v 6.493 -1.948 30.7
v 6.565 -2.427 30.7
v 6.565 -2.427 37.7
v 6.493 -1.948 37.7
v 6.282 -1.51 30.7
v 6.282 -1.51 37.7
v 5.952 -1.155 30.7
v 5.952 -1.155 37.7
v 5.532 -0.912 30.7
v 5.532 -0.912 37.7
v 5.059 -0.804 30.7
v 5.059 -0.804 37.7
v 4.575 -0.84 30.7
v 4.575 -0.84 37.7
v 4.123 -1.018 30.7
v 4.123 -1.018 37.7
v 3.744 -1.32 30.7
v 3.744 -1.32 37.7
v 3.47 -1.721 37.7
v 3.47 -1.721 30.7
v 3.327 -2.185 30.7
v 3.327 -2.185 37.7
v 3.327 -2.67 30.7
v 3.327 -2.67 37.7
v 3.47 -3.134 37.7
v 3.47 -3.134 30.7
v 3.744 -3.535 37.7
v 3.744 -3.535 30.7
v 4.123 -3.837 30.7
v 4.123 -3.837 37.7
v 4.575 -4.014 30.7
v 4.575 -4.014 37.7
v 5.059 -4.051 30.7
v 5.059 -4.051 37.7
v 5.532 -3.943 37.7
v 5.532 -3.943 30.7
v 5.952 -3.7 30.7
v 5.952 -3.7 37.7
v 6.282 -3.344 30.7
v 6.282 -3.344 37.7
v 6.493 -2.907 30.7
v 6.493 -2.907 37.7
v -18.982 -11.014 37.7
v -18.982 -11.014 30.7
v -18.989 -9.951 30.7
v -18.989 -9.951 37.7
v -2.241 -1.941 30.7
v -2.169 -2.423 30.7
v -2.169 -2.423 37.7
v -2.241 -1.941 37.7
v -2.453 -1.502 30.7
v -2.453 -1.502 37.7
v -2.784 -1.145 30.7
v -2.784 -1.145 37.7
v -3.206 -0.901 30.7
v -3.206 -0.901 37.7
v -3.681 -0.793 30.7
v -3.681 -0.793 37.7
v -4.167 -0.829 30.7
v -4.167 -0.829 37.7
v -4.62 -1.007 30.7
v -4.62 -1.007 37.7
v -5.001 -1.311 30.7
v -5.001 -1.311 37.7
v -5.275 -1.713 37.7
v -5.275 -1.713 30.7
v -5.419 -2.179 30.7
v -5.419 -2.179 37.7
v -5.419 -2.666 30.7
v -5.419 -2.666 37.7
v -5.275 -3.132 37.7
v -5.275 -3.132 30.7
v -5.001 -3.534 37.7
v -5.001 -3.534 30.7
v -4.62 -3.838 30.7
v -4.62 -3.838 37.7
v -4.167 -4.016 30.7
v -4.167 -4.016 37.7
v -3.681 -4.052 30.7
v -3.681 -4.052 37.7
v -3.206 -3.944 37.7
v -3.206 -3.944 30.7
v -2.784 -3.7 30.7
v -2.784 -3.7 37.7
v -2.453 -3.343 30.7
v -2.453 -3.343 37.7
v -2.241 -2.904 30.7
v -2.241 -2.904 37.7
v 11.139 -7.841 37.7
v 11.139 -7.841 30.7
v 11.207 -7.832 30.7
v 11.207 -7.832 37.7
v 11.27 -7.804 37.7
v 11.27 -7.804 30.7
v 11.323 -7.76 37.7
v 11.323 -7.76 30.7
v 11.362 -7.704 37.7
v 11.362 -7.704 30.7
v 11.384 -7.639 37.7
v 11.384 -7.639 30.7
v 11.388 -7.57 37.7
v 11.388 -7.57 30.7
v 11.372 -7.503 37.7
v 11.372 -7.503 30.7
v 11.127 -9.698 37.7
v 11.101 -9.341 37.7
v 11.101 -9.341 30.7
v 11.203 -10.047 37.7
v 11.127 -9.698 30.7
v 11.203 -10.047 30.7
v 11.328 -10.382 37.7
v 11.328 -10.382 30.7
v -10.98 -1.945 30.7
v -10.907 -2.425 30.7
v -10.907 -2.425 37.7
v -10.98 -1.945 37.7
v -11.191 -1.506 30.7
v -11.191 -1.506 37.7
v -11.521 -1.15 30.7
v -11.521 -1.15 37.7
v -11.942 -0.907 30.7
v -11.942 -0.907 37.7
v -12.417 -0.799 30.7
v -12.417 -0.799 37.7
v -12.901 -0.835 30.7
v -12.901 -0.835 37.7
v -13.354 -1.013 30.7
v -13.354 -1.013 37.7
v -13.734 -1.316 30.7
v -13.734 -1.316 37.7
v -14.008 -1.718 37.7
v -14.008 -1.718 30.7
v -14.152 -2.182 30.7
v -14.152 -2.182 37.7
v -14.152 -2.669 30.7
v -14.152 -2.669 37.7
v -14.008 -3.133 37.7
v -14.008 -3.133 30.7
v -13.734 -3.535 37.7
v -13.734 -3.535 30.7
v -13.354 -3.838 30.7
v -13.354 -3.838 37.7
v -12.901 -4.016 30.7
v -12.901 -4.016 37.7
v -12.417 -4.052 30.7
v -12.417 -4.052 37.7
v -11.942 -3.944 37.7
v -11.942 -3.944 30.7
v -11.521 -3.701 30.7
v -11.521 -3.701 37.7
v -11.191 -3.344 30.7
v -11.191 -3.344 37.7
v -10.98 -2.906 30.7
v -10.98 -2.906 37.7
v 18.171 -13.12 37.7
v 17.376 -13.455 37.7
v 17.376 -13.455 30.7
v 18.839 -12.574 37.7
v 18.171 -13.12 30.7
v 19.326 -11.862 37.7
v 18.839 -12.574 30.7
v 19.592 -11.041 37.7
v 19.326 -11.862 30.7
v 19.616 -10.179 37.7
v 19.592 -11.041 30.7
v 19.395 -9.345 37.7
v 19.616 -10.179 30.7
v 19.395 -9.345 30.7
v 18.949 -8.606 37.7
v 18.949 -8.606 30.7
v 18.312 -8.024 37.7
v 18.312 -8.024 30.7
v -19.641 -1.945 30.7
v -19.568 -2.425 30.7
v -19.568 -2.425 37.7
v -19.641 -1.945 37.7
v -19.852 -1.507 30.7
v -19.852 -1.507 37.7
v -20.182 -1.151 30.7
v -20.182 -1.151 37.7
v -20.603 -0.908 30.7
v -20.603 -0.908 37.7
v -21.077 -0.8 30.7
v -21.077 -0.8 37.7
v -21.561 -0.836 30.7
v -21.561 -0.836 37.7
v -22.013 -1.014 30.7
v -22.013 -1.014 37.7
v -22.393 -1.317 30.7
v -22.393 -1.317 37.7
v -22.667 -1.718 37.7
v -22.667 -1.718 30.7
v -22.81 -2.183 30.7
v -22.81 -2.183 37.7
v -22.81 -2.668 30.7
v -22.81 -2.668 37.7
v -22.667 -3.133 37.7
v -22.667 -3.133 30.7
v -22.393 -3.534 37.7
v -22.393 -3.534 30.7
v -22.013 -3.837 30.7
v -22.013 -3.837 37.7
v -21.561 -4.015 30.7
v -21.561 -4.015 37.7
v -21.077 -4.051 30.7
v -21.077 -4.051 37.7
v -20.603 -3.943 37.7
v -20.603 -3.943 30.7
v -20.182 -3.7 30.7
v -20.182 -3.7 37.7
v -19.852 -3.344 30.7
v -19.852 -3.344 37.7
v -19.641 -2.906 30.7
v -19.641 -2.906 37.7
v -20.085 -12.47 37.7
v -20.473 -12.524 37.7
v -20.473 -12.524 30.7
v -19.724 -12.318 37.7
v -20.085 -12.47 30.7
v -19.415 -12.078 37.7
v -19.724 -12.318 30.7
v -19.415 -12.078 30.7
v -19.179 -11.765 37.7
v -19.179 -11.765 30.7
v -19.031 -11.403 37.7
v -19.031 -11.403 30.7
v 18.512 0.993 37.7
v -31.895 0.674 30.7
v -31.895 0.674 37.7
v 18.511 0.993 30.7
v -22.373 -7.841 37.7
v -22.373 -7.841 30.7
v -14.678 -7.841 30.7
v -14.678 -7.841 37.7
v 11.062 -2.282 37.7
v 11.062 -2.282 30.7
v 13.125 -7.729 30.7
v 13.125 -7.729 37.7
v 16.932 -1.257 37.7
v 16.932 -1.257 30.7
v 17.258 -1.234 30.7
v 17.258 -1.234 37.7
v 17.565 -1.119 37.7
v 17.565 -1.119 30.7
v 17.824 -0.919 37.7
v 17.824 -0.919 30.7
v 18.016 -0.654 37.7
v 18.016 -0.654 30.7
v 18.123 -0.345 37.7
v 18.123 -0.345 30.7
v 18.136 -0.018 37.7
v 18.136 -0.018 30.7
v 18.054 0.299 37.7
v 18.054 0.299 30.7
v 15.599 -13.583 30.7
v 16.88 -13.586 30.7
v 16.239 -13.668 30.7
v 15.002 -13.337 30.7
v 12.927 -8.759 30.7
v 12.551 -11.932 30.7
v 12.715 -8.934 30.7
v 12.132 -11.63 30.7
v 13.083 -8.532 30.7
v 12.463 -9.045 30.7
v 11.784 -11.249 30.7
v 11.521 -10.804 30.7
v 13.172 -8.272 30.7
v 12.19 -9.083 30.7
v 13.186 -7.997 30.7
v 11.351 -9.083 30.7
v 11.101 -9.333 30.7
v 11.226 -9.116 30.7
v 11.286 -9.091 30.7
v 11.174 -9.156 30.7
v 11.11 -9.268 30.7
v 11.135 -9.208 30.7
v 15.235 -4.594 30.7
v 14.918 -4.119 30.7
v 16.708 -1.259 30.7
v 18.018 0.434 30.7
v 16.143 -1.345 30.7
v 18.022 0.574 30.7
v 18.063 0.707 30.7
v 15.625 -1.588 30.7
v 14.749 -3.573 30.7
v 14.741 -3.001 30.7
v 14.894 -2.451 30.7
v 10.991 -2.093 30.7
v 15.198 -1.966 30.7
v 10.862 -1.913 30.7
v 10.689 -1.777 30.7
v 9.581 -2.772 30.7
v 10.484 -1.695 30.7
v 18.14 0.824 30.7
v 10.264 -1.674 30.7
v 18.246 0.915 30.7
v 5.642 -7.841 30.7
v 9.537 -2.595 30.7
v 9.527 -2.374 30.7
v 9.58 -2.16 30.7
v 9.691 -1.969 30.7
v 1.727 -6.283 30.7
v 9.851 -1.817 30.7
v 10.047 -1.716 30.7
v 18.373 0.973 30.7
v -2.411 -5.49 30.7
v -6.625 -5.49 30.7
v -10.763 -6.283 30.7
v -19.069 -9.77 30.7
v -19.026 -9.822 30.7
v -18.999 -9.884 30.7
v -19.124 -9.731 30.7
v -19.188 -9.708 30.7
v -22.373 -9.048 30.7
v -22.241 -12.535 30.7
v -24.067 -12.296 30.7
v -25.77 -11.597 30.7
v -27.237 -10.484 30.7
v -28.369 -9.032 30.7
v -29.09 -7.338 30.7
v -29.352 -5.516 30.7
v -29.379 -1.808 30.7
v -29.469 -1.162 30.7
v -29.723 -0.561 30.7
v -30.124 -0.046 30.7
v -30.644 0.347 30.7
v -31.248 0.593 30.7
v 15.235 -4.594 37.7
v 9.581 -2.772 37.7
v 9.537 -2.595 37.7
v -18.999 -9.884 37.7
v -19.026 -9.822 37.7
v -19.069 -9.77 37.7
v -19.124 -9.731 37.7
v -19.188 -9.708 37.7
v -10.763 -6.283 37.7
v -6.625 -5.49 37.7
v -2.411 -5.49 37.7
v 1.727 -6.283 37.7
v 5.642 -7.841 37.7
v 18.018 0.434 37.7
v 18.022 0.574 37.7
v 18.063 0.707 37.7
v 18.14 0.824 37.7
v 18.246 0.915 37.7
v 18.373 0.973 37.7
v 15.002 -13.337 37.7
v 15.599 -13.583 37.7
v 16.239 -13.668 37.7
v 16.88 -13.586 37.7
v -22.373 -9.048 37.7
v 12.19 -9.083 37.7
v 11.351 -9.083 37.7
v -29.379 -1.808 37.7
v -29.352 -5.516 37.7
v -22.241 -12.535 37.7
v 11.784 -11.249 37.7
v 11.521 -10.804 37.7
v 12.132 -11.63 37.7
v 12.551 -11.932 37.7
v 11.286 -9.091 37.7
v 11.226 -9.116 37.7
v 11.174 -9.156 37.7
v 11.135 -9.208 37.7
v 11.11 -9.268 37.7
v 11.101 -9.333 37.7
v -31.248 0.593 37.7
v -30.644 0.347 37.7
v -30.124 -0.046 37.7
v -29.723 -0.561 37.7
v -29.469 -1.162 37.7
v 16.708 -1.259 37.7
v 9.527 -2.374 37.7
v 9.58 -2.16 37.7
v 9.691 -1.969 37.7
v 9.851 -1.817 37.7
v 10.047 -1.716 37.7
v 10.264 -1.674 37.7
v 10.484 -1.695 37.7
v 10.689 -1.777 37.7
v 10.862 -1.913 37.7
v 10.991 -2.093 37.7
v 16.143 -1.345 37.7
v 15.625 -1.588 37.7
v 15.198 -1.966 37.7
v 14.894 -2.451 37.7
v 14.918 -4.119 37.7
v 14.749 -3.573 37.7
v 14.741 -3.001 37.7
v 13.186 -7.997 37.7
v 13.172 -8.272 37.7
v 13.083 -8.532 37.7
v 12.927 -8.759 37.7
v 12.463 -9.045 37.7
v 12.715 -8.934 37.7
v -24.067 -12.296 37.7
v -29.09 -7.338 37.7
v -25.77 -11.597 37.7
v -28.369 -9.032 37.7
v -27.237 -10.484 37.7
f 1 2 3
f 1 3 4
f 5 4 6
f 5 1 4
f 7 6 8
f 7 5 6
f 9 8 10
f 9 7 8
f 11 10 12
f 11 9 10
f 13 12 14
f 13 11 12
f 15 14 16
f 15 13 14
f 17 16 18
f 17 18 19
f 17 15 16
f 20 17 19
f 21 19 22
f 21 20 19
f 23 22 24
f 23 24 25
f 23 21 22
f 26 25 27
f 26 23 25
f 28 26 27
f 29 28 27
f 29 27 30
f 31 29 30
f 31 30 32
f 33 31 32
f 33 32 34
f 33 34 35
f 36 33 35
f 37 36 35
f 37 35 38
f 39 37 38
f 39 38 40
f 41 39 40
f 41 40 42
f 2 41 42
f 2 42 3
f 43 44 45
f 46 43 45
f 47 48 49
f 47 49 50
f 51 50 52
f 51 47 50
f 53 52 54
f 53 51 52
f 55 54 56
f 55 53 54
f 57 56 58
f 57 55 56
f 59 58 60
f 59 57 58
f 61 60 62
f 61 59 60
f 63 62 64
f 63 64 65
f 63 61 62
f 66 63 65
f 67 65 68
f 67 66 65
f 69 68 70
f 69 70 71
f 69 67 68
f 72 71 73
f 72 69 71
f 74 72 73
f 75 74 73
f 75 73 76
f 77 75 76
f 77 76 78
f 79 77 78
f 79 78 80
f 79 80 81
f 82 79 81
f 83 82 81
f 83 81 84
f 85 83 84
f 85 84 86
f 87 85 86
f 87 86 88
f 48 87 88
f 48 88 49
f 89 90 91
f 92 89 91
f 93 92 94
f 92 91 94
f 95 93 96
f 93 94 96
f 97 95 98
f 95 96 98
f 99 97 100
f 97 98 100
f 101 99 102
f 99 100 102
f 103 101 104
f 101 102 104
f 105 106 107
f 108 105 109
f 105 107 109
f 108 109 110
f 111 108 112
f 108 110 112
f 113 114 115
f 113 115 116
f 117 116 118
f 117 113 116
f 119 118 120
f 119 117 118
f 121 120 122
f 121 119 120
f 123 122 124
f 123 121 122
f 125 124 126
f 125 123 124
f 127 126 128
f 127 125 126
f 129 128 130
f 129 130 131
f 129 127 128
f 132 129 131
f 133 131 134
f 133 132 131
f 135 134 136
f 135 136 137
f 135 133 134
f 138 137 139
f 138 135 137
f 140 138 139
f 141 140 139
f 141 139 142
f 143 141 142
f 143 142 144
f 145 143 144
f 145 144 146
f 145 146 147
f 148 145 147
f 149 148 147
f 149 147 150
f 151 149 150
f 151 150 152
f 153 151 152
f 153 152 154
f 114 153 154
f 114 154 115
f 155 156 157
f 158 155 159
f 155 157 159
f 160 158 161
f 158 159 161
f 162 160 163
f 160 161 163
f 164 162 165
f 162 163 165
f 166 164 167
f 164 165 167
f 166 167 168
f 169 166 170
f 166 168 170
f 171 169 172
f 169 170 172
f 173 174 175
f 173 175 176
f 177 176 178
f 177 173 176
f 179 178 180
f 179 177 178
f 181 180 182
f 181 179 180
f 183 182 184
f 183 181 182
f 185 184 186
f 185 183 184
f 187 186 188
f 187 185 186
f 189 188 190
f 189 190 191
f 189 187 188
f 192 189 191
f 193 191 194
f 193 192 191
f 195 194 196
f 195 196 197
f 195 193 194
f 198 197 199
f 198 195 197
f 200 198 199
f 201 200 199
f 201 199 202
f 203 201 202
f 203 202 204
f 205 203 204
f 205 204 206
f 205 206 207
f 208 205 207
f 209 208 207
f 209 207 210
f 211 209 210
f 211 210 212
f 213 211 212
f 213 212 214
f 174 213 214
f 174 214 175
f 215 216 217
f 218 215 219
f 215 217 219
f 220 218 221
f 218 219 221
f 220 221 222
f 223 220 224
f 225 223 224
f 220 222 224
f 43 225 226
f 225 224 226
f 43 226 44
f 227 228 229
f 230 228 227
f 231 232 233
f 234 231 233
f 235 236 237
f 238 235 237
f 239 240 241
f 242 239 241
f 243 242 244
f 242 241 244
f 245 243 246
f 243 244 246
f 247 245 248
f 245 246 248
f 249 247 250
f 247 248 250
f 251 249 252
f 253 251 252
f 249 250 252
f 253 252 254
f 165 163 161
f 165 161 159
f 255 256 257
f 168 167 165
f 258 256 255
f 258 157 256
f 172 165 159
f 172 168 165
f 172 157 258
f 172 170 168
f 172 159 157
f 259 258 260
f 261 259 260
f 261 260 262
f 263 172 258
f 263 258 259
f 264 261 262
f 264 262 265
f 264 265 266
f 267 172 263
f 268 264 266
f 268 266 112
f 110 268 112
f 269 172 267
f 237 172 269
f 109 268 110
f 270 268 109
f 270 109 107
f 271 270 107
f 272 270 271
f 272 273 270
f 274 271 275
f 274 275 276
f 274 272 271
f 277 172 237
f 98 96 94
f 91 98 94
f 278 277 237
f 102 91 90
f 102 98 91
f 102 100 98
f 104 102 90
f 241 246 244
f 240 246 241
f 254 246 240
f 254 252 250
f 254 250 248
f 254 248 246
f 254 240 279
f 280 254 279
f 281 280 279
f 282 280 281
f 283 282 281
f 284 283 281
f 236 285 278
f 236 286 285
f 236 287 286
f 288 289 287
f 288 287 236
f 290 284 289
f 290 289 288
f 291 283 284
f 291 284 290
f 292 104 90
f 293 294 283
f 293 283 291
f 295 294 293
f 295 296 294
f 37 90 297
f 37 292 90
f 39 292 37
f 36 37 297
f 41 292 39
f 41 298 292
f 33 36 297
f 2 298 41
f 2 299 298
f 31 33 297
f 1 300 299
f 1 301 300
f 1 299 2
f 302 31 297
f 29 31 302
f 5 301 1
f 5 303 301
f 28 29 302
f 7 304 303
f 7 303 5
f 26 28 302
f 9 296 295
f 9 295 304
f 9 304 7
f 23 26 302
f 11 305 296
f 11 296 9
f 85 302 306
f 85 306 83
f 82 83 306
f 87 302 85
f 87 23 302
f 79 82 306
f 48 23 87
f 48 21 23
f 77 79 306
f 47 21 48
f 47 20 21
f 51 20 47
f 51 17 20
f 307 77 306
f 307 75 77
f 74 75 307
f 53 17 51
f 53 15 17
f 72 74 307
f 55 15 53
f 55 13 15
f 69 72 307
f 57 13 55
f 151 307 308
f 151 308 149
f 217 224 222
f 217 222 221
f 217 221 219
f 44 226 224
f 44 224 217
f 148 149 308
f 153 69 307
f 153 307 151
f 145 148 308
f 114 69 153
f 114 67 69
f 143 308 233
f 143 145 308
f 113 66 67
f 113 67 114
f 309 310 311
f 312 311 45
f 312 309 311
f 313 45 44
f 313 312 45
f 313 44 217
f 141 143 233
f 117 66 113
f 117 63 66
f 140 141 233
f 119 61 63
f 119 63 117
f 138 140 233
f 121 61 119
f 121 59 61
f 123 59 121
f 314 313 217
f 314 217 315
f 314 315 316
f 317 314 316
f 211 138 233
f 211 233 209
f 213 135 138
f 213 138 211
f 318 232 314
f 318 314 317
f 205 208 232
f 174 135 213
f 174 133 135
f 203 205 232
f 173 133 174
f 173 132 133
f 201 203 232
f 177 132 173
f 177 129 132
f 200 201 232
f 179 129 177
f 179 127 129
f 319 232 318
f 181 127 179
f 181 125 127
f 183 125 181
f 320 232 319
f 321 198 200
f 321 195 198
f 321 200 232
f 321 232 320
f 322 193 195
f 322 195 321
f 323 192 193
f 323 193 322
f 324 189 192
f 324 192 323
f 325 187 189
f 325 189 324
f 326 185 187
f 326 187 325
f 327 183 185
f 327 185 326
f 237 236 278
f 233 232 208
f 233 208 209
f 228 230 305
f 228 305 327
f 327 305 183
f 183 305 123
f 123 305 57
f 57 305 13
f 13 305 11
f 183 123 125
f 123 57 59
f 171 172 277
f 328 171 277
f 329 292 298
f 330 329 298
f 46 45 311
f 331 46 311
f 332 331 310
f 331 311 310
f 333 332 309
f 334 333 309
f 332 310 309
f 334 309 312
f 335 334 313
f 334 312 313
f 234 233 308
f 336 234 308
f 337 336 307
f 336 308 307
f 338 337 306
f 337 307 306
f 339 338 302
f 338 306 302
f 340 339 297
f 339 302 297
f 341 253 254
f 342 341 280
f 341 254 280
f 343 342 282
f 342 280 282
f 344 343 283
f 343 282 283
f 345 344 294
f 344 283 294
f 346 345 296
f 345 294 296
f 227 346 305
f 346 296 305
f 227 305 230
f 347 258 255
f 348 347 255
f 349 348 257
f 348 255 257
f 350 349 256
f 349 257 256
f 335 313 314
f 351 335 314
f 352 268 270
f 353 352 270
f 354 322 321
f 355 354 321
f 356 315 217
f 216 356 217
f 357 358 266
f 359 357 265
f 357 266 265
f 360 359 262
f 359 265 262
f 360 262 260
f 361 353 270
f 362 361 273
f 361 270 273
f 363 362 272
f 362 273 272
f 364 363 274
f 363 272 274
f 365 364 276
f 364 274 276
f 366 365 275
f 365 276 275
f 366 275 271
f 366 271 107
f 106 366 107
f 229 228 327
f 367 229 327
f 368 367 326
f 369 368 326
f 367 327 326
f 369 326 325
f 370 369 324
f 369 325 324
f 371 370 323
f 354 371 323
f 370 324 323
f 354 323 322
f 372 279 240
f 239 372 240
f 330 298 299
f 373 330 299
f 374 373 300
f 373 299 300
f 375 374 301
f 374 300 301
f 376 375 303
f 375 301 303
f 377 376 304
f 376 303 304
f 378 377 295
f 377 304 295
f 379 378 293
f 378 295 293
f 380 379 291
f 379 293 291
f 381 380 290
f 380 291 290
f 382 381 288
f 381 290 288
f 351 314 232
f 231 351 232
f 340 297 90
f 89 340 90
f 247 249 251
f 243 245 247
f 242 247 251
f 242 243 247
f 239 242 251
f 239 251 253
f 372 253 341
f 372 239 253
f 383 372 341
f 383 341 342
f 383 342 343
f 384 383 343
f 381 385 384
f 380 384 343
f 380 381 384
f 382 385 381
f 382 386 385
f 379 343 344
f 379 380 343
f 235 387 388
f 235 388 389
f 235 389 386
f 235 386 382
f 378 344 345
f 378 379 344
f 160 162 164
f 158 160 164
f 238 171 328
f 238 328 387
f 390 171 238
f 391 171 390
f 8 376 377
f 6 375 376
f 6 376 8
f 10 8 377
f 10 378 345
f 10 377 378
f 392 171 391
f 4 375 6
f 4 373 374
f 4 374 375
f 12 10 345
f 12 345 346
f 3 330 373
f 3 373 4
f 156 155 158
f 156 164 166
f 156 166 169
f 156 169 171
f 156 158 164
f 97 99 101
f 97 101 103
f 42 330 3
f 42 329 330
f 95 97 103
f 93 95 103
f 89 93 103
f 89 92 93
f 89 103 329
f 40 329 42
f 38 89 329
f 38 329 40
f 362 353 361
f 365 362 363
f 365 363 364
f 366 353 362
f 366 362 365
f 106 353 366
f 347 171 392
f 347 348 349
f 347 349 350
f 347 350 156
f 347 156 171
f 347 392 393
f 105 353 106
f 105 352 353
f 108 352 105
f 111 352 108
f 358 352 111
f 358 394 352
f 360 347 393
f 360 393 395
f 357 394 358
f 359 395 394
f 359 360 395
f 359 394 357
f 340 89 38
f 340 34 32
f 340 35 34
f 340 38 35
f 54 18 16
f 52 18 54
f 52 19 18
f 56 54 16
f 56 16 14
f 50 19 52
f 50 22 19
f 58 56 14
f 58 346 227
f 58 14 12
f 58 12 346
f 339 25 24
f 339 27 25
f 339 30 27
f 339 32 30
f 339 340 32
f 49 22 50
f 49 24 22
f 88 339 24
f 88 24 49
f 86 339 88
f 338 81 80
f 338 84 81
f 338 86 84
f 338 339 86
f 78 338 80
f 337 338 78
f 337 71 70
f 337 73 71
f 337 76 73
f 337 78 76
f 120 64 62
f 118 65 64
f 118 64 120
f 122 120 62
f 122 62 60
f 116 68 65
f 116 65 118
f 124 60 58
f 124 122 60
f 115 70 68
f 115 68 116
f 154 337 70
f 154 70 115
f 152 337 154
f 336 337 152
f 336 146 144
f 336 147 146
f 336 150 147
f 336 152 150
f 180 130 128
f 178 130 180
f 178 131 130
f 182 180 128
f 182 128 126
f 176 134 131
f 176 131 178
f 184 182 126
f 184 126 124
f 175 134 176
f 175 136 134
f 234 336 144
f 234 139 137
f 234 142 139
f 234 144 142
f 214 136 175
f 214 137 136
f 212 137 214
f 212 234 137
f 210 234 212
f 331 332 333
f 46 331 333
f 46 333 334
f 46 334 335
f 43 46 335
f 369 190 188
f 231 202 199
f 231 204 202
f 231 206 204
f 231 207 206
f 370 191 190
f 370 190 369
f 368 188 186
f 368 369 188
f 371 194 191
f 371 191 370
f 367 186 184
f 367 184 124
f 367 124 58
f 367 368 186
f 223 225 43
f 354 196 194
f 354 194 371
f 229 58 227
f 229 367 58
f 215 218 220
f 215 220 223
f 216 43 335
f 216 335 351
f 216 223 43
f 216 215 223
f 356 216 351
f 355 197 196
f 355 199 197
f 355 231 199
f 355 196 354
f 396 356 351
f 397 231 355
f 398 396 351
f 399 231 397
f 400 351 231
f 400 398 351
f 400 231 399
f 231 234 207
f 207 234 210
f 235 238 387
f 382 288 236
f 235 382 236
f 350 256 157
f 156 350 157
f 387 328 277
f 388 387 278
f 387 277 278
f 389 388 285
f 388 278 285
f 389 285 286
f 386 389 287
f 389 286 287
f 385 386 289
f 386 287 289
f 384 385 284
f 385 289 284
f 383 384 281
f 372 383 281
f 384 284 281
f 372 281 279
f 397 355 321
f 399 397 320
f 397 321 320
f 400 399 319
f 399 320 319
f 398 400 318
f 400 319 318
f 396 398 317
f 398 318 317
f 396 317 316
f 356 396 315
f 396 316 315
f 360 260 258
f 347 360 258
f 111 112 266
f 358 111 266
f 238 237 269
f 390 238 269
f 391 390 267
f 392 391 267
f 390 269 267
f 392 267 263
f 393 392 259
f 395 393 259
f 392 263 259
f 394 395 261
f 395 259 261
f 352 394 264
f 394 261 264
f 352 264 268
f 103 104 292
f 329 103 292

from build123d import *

# Parameters (mm, degrees)
SZKIC1_R                    = 1.63
SZKIC1_R_2                  = 1.627886045
SZKIC1_R_3                  = 1.634186666
SZKIC1_R_4                  = 1.631321013
DODANIE_WYCI_GNI_CIE1_DEPTH = 37.7
SZKIC2_W                    = 96.882996132
SZKIC2_H                    = 10
WYTNIJ_WYCI_GNI_CIE1_DEPTH  = 3.027599165
SZKIC4_W                    = 27.7
SZKIC4_H                    = 3.027599165
DODANIE_WYCI_GNI_CIE2_DEPTH = 4.6
SZKIC5_W                    = 27.7
SZKIC5_H                    = 3.027593756
DODANIE_WYCI_GNI_CIE4_DEPTH = 4.6
WYTNIJ_WYCI_GNI_CIE2_REACH  = 74.407
SZKIC6_R                    = 2.5
SZKIC7_W                    = 110.003784397
SZKIC7_H                    = 59.74457964
WYTNIJ_WYCI_GNI_CIE4_DEPTH  = 30.7


with BuildPart() as part:
    # Szkic1 → Dodanie-wyciągnięcie1 (new body)
    with BuildSketch(Plane(origin=(0, 0, 0), x_dir=(-1, 0, 0), z_dir=(0, 0, 1))):
        with BuildLine():
            Line((-42.206476447, -1.143440143), (-42.187291437, -4.170973113))
            Line((-42.187291437, -4.170973113), (54.693759689, -3.557073712))
            Line((54.693759689, -3.557073712), (54.674575297, -0.529535329))
            Line((54.674575297, -0.529535329), (31.895047363, -0.673880775))
            ThreePointArc((31.895047363, -0.673880775), (30.123615765, 0.046208772), (29.379274421, 1.807587444))
            Line((29.379274421, 1.807587444), (29.351860706, 5.515732081))
            ThreePointArc((29.351860706, 5.515732081), (27.236675167, 10.484490063), (22.240808109, 12.534826154))
            Line((22.240808109, 12.534826154), (20.472861468, 12.523590896))
            ThreePointArc((20.472861468, 12.523590896), (19.415024557, 12.077529638), (18.982423849, 11.01411711))
            Line((18.982423849, 11.01411711), (18.989158593, 9.951213651))
            ThreePointArc((18.989158593, 9.951213651), (19.04575769, 9.79437408), (19.188385802, 9.708006664))
            Line((19.188385802, 9.708006664), (22.37305409, 9.047530924))
            Line((22.37305409, 9.047530924), (22.37305409, 7.841359432))
            Line((22.37305409, 7.841359432), (14.677855674, 7.841359432))
            ThreePointArc((14.677855674, 7.841359432), (4.517774256, 5.390280076), (-5.642307162, 7.841359432))
            Line((-5.642307162, 7.841359432), (-11.13863745, 7.841359432))
            ThreePointArc((-11.13863745, 7.841359432), (-11.344351569, 7.733421748), (-11.372431243, 7.502813045))
            Line((-11.372431243, 7.502813045), (-9.580573211, 2.77167383))
            Line((-9.580573211, 2.77167383), (-9.53660226, 2.594556029))
            ThreePointArc((-9.53660226, 2.594556029), (-10.047085724, 1.71578131), (-10.990723107, 2.09312315))
            Line((-10.990723107, 2.09312315), (-11.062286258, 2.28207519))
            Line((-11.062286258, 2.28207519), (-13.125087597, 7.728600603))
            ThreePointArc((-13.125087597, 7.728600603), (-13.0127689, 8.651035416), (-12.189912428, 9.082786152))
            Line((-12.189912428, 9.082786152), (-11.351176976, 9.082786152))
            ThreePointArc((-11.351176976, 9.082786152), (-11.174400281, 9.156009457), (-11.101176976, 9.332786152))
            Line((-11.101176976, 9.332786152), (-11.101176976, 9.341072815))
            ThreePointArc((-11.101176976, 9.341072815), (-11.158575506, 9.873705952), (-11.328135423, 10.381881202))
            Line((-11.328135423, 10.381881202), (-11.52139656, 10.803947934))
            ThreePointArc((-11.52139656, 10.803947934), (-11.948131465, 11.44871119), (-12.551468508, 11.932246866))
            Line((-12.551468508, 11.932246866), (-15.002316135, 13.336662904))
            ThreePointArc((-15.002316135, 13.336662904), (-15.916443983, 13.645833839), (-16.879567484, 13.585754641))
            Line((-16.879567484, 13.585754641), (-17.376357402, 13.455449083))
            ThreePointArc((-17.376357402, 13.455449083), (-19.591854135, 11.040960081), (-18.31207326, 8.024282466))
            Line((-18.31207326, 8.024282466), (-15.235252345, 4.594263276))
            ThreePointArc((-15.235252345, 4.594263276), (-14.894447251, 2.450948387), (-16.707962408, 1.258845372))
            Line((-16.707962408, 1.258845372), (-16.931951142, 1.257044798))
            ThreePointArc((-16.931951142, 1.257044798), (-17.929768207, 0.793667315), (-18.054097125, -0.299447458))
            ThreePointArc((-18.054097125, -0.299447458), (-18.09762478, -0.768632421), (-18.511820167, -0.993290758))
            Line((-18.511820167, -0.993290758), (-42.206476447, -1.143440143))
        make_face()
        with Locations(Location((21.198480742, 2.425447379, 0), (0, 0, 180))):
            Circle(SZKIC1_R, mode=Mode.SUBTRACT)
        with Locations(Location((-4.937145948, 2.427386246, 0), (0, 0, 180))):
            Circle(SZKIC1_R_2, mode=Mode.SUBTRACT)
        with Locations(Location((3.802928012, 2.422545785, 0), (0, 0, 180))):
            Circle(SZKIC1_R_3, mode=Mode.SUBTRACT)
        with Locations(Location((12.538480742, 2.425447379, 0), (0, 0, 180))):
            Circle(SZKIC1_R_4, mode=Mode.SUBTRACT)
    extrude(amount=DODANIE_WYCI_GNI_CIE1_DEPTH)

    # Szkic2 → Wytnij-wyciągnięcie1 (cut)
    with BuildSketch(Plane(origin=(-0.02473498, 3.903491109, 0), x_dir=(0.9999799241630359, 0.006336503048932176, 0), z_dir=(-0.006336503048932176, 0.9999799241630359, 0))):
        with Locations((-6.228624191, -32.7)):
            Rectangle(SZKIC2_W, SZKIC2_H)
    extrude(amount=-WYTNIJ_WYCI_GNI_CIE1_DEPTH, mode=Mode.SUBTRACT)

    # Szkic4 → Dodanie-wyciągnięcie2 (add)
    with BuildSketch(Plane(origin=(-54.669024709, -0.346417396, 0), x_dir=(0, 0, 1), z_dir=(-0.9999799241630359, -0.006336503048932243, 0))):
        with Locations((13.85, 2.389769894)):
            Rectangle(SZKIC4_W, SZKIC4_H)
    extrude(amount=DODANIE_WYCI_GNI_CIE2_DEPTH)

    # Szkic5 → Dodanie-wyciągnięcie4 (add)
    with BuildSketch(Plane(origin=(42.212027201, 0.26749111, 0), x_dir=(0, 0, -1), z_dir=(0.9999799227968423, 0.00633671864778665, 0))):
        with Locations((-13.85, 2.389763497)):
            Rectangle(SZKIC5_W, SZKIC5_H)
    extrude(amount=DODANIE_WYCI_GNI_CIE4_DEPTH)

    # Wytnij-wyciągnięcie2: up to this face of the body (flat: up to its plane)
    wytnij_wyci_gni_cie2_end = Plane(part.part.faces().sort_by_distance((-45.584765156, 0.587134095, 13.85))[0])
    # Szkic6 → Wytnij-wyciągnięcie2 (cut, up to the picked face)
    with BuildSketch(Plane(origin=(-0.02473498, 3.903491109, 0), x_dir=(0.9999799241630359, 0.006336503048932172, 0), z_dir=(-0.006336503048932172, 0.9999799241630359, 0)), mode=Mode.PRIVATE) as wytnij_wyci_gni_cie2_sk1:
        with Locations((-53.770122257, -7.5)):
            Circle(SZKIC6_R)
    wytnij_wyci_gni_cie2_tool1 = split(extrude(wytnij_wyci_gni_cie2_sk1.sketch, amount=-WYTNIJ_WYCI_GNI_CIE2_REACH, mode=Mode.PRIVATE), bisect_by=wytnij_wyci_gni_cie2_end, keep=Keep.BOTH, mode=Mode.PRIVATE)
    # Szkic6 → Wytnij-wyciągnięcie2 (cut, up to the picked face)
    with BuildSketch(Plane(origin=(-0.02473498, 3.903491109, 0), x_dir=(0.9999799241630359, 0.006336503048932172, 0), z_dir=(-0.006336503048932172, 0.9999799241630359, 0)), mode=Mode.PRIVATE) as wytnij_wyci_gni_cie2_sk2:
        with Locations((41.312873875, -7.5)):
            Circle(SZKIC6_R)
    wytnij_wyci_gni_cie2_tool2 = split(extrude(wytnij_wyci_gni_cie2_sk2.sketch, amount=-WYTNIJ_WYCI_GNI_CIE2_REACH, mode=Mode.PRIVATE), bisect_by=wytnij_wyci_gni_cie2_end, keep=Keep.BOTH, mode=Mode.PRIVATE)
    add(wytnij_wyci_gni_cie2_tool1.solids().sort_by(Axis((-53.793778, 3.562777, 7.5), (0.006336503048932172, -0.9999799241630359, 0)))[0], mode=Mode.SUBTRACT)
    add(wytnij_wyci_gni_cie2_tool2.solids().sort_by(Axis((41.28731, 4.16527, 7.5), (0.006336503048932172, -0.9999799241630359, 0)))[0], mode=Mode.SUBTRACT)

    # Szkic7 → Wytnij-wyciągnięcie4 (cut)
    with BuildSketch(Plane(origin=(0, 0, 0), x_dir=(-1, 0, 0), z_dir=(0, 0, -1))):
        with Locations((7.955893791, -24.915165787)):
            Rectangle(SZKIC7_W, SZKIC7_H)
    extrude(amount=-WYTNIJ_WYCI_GNI_CIE4_DEPTH, mode=Mode.SUBTRACT)


with BuildPart() as wytnij_wyci_gni_cie4_kept_piece:
    # of the separate pieces the step leaves, the one the design keeps (wytnij_wyci_gni_cie4_pieces_kept)
    add(part.part.solids().sort_by_distance((18.31207326, -8.024282466, 30.7))[0])


solid = wytnij_wyci_gni_cie4_kept_piece.part
